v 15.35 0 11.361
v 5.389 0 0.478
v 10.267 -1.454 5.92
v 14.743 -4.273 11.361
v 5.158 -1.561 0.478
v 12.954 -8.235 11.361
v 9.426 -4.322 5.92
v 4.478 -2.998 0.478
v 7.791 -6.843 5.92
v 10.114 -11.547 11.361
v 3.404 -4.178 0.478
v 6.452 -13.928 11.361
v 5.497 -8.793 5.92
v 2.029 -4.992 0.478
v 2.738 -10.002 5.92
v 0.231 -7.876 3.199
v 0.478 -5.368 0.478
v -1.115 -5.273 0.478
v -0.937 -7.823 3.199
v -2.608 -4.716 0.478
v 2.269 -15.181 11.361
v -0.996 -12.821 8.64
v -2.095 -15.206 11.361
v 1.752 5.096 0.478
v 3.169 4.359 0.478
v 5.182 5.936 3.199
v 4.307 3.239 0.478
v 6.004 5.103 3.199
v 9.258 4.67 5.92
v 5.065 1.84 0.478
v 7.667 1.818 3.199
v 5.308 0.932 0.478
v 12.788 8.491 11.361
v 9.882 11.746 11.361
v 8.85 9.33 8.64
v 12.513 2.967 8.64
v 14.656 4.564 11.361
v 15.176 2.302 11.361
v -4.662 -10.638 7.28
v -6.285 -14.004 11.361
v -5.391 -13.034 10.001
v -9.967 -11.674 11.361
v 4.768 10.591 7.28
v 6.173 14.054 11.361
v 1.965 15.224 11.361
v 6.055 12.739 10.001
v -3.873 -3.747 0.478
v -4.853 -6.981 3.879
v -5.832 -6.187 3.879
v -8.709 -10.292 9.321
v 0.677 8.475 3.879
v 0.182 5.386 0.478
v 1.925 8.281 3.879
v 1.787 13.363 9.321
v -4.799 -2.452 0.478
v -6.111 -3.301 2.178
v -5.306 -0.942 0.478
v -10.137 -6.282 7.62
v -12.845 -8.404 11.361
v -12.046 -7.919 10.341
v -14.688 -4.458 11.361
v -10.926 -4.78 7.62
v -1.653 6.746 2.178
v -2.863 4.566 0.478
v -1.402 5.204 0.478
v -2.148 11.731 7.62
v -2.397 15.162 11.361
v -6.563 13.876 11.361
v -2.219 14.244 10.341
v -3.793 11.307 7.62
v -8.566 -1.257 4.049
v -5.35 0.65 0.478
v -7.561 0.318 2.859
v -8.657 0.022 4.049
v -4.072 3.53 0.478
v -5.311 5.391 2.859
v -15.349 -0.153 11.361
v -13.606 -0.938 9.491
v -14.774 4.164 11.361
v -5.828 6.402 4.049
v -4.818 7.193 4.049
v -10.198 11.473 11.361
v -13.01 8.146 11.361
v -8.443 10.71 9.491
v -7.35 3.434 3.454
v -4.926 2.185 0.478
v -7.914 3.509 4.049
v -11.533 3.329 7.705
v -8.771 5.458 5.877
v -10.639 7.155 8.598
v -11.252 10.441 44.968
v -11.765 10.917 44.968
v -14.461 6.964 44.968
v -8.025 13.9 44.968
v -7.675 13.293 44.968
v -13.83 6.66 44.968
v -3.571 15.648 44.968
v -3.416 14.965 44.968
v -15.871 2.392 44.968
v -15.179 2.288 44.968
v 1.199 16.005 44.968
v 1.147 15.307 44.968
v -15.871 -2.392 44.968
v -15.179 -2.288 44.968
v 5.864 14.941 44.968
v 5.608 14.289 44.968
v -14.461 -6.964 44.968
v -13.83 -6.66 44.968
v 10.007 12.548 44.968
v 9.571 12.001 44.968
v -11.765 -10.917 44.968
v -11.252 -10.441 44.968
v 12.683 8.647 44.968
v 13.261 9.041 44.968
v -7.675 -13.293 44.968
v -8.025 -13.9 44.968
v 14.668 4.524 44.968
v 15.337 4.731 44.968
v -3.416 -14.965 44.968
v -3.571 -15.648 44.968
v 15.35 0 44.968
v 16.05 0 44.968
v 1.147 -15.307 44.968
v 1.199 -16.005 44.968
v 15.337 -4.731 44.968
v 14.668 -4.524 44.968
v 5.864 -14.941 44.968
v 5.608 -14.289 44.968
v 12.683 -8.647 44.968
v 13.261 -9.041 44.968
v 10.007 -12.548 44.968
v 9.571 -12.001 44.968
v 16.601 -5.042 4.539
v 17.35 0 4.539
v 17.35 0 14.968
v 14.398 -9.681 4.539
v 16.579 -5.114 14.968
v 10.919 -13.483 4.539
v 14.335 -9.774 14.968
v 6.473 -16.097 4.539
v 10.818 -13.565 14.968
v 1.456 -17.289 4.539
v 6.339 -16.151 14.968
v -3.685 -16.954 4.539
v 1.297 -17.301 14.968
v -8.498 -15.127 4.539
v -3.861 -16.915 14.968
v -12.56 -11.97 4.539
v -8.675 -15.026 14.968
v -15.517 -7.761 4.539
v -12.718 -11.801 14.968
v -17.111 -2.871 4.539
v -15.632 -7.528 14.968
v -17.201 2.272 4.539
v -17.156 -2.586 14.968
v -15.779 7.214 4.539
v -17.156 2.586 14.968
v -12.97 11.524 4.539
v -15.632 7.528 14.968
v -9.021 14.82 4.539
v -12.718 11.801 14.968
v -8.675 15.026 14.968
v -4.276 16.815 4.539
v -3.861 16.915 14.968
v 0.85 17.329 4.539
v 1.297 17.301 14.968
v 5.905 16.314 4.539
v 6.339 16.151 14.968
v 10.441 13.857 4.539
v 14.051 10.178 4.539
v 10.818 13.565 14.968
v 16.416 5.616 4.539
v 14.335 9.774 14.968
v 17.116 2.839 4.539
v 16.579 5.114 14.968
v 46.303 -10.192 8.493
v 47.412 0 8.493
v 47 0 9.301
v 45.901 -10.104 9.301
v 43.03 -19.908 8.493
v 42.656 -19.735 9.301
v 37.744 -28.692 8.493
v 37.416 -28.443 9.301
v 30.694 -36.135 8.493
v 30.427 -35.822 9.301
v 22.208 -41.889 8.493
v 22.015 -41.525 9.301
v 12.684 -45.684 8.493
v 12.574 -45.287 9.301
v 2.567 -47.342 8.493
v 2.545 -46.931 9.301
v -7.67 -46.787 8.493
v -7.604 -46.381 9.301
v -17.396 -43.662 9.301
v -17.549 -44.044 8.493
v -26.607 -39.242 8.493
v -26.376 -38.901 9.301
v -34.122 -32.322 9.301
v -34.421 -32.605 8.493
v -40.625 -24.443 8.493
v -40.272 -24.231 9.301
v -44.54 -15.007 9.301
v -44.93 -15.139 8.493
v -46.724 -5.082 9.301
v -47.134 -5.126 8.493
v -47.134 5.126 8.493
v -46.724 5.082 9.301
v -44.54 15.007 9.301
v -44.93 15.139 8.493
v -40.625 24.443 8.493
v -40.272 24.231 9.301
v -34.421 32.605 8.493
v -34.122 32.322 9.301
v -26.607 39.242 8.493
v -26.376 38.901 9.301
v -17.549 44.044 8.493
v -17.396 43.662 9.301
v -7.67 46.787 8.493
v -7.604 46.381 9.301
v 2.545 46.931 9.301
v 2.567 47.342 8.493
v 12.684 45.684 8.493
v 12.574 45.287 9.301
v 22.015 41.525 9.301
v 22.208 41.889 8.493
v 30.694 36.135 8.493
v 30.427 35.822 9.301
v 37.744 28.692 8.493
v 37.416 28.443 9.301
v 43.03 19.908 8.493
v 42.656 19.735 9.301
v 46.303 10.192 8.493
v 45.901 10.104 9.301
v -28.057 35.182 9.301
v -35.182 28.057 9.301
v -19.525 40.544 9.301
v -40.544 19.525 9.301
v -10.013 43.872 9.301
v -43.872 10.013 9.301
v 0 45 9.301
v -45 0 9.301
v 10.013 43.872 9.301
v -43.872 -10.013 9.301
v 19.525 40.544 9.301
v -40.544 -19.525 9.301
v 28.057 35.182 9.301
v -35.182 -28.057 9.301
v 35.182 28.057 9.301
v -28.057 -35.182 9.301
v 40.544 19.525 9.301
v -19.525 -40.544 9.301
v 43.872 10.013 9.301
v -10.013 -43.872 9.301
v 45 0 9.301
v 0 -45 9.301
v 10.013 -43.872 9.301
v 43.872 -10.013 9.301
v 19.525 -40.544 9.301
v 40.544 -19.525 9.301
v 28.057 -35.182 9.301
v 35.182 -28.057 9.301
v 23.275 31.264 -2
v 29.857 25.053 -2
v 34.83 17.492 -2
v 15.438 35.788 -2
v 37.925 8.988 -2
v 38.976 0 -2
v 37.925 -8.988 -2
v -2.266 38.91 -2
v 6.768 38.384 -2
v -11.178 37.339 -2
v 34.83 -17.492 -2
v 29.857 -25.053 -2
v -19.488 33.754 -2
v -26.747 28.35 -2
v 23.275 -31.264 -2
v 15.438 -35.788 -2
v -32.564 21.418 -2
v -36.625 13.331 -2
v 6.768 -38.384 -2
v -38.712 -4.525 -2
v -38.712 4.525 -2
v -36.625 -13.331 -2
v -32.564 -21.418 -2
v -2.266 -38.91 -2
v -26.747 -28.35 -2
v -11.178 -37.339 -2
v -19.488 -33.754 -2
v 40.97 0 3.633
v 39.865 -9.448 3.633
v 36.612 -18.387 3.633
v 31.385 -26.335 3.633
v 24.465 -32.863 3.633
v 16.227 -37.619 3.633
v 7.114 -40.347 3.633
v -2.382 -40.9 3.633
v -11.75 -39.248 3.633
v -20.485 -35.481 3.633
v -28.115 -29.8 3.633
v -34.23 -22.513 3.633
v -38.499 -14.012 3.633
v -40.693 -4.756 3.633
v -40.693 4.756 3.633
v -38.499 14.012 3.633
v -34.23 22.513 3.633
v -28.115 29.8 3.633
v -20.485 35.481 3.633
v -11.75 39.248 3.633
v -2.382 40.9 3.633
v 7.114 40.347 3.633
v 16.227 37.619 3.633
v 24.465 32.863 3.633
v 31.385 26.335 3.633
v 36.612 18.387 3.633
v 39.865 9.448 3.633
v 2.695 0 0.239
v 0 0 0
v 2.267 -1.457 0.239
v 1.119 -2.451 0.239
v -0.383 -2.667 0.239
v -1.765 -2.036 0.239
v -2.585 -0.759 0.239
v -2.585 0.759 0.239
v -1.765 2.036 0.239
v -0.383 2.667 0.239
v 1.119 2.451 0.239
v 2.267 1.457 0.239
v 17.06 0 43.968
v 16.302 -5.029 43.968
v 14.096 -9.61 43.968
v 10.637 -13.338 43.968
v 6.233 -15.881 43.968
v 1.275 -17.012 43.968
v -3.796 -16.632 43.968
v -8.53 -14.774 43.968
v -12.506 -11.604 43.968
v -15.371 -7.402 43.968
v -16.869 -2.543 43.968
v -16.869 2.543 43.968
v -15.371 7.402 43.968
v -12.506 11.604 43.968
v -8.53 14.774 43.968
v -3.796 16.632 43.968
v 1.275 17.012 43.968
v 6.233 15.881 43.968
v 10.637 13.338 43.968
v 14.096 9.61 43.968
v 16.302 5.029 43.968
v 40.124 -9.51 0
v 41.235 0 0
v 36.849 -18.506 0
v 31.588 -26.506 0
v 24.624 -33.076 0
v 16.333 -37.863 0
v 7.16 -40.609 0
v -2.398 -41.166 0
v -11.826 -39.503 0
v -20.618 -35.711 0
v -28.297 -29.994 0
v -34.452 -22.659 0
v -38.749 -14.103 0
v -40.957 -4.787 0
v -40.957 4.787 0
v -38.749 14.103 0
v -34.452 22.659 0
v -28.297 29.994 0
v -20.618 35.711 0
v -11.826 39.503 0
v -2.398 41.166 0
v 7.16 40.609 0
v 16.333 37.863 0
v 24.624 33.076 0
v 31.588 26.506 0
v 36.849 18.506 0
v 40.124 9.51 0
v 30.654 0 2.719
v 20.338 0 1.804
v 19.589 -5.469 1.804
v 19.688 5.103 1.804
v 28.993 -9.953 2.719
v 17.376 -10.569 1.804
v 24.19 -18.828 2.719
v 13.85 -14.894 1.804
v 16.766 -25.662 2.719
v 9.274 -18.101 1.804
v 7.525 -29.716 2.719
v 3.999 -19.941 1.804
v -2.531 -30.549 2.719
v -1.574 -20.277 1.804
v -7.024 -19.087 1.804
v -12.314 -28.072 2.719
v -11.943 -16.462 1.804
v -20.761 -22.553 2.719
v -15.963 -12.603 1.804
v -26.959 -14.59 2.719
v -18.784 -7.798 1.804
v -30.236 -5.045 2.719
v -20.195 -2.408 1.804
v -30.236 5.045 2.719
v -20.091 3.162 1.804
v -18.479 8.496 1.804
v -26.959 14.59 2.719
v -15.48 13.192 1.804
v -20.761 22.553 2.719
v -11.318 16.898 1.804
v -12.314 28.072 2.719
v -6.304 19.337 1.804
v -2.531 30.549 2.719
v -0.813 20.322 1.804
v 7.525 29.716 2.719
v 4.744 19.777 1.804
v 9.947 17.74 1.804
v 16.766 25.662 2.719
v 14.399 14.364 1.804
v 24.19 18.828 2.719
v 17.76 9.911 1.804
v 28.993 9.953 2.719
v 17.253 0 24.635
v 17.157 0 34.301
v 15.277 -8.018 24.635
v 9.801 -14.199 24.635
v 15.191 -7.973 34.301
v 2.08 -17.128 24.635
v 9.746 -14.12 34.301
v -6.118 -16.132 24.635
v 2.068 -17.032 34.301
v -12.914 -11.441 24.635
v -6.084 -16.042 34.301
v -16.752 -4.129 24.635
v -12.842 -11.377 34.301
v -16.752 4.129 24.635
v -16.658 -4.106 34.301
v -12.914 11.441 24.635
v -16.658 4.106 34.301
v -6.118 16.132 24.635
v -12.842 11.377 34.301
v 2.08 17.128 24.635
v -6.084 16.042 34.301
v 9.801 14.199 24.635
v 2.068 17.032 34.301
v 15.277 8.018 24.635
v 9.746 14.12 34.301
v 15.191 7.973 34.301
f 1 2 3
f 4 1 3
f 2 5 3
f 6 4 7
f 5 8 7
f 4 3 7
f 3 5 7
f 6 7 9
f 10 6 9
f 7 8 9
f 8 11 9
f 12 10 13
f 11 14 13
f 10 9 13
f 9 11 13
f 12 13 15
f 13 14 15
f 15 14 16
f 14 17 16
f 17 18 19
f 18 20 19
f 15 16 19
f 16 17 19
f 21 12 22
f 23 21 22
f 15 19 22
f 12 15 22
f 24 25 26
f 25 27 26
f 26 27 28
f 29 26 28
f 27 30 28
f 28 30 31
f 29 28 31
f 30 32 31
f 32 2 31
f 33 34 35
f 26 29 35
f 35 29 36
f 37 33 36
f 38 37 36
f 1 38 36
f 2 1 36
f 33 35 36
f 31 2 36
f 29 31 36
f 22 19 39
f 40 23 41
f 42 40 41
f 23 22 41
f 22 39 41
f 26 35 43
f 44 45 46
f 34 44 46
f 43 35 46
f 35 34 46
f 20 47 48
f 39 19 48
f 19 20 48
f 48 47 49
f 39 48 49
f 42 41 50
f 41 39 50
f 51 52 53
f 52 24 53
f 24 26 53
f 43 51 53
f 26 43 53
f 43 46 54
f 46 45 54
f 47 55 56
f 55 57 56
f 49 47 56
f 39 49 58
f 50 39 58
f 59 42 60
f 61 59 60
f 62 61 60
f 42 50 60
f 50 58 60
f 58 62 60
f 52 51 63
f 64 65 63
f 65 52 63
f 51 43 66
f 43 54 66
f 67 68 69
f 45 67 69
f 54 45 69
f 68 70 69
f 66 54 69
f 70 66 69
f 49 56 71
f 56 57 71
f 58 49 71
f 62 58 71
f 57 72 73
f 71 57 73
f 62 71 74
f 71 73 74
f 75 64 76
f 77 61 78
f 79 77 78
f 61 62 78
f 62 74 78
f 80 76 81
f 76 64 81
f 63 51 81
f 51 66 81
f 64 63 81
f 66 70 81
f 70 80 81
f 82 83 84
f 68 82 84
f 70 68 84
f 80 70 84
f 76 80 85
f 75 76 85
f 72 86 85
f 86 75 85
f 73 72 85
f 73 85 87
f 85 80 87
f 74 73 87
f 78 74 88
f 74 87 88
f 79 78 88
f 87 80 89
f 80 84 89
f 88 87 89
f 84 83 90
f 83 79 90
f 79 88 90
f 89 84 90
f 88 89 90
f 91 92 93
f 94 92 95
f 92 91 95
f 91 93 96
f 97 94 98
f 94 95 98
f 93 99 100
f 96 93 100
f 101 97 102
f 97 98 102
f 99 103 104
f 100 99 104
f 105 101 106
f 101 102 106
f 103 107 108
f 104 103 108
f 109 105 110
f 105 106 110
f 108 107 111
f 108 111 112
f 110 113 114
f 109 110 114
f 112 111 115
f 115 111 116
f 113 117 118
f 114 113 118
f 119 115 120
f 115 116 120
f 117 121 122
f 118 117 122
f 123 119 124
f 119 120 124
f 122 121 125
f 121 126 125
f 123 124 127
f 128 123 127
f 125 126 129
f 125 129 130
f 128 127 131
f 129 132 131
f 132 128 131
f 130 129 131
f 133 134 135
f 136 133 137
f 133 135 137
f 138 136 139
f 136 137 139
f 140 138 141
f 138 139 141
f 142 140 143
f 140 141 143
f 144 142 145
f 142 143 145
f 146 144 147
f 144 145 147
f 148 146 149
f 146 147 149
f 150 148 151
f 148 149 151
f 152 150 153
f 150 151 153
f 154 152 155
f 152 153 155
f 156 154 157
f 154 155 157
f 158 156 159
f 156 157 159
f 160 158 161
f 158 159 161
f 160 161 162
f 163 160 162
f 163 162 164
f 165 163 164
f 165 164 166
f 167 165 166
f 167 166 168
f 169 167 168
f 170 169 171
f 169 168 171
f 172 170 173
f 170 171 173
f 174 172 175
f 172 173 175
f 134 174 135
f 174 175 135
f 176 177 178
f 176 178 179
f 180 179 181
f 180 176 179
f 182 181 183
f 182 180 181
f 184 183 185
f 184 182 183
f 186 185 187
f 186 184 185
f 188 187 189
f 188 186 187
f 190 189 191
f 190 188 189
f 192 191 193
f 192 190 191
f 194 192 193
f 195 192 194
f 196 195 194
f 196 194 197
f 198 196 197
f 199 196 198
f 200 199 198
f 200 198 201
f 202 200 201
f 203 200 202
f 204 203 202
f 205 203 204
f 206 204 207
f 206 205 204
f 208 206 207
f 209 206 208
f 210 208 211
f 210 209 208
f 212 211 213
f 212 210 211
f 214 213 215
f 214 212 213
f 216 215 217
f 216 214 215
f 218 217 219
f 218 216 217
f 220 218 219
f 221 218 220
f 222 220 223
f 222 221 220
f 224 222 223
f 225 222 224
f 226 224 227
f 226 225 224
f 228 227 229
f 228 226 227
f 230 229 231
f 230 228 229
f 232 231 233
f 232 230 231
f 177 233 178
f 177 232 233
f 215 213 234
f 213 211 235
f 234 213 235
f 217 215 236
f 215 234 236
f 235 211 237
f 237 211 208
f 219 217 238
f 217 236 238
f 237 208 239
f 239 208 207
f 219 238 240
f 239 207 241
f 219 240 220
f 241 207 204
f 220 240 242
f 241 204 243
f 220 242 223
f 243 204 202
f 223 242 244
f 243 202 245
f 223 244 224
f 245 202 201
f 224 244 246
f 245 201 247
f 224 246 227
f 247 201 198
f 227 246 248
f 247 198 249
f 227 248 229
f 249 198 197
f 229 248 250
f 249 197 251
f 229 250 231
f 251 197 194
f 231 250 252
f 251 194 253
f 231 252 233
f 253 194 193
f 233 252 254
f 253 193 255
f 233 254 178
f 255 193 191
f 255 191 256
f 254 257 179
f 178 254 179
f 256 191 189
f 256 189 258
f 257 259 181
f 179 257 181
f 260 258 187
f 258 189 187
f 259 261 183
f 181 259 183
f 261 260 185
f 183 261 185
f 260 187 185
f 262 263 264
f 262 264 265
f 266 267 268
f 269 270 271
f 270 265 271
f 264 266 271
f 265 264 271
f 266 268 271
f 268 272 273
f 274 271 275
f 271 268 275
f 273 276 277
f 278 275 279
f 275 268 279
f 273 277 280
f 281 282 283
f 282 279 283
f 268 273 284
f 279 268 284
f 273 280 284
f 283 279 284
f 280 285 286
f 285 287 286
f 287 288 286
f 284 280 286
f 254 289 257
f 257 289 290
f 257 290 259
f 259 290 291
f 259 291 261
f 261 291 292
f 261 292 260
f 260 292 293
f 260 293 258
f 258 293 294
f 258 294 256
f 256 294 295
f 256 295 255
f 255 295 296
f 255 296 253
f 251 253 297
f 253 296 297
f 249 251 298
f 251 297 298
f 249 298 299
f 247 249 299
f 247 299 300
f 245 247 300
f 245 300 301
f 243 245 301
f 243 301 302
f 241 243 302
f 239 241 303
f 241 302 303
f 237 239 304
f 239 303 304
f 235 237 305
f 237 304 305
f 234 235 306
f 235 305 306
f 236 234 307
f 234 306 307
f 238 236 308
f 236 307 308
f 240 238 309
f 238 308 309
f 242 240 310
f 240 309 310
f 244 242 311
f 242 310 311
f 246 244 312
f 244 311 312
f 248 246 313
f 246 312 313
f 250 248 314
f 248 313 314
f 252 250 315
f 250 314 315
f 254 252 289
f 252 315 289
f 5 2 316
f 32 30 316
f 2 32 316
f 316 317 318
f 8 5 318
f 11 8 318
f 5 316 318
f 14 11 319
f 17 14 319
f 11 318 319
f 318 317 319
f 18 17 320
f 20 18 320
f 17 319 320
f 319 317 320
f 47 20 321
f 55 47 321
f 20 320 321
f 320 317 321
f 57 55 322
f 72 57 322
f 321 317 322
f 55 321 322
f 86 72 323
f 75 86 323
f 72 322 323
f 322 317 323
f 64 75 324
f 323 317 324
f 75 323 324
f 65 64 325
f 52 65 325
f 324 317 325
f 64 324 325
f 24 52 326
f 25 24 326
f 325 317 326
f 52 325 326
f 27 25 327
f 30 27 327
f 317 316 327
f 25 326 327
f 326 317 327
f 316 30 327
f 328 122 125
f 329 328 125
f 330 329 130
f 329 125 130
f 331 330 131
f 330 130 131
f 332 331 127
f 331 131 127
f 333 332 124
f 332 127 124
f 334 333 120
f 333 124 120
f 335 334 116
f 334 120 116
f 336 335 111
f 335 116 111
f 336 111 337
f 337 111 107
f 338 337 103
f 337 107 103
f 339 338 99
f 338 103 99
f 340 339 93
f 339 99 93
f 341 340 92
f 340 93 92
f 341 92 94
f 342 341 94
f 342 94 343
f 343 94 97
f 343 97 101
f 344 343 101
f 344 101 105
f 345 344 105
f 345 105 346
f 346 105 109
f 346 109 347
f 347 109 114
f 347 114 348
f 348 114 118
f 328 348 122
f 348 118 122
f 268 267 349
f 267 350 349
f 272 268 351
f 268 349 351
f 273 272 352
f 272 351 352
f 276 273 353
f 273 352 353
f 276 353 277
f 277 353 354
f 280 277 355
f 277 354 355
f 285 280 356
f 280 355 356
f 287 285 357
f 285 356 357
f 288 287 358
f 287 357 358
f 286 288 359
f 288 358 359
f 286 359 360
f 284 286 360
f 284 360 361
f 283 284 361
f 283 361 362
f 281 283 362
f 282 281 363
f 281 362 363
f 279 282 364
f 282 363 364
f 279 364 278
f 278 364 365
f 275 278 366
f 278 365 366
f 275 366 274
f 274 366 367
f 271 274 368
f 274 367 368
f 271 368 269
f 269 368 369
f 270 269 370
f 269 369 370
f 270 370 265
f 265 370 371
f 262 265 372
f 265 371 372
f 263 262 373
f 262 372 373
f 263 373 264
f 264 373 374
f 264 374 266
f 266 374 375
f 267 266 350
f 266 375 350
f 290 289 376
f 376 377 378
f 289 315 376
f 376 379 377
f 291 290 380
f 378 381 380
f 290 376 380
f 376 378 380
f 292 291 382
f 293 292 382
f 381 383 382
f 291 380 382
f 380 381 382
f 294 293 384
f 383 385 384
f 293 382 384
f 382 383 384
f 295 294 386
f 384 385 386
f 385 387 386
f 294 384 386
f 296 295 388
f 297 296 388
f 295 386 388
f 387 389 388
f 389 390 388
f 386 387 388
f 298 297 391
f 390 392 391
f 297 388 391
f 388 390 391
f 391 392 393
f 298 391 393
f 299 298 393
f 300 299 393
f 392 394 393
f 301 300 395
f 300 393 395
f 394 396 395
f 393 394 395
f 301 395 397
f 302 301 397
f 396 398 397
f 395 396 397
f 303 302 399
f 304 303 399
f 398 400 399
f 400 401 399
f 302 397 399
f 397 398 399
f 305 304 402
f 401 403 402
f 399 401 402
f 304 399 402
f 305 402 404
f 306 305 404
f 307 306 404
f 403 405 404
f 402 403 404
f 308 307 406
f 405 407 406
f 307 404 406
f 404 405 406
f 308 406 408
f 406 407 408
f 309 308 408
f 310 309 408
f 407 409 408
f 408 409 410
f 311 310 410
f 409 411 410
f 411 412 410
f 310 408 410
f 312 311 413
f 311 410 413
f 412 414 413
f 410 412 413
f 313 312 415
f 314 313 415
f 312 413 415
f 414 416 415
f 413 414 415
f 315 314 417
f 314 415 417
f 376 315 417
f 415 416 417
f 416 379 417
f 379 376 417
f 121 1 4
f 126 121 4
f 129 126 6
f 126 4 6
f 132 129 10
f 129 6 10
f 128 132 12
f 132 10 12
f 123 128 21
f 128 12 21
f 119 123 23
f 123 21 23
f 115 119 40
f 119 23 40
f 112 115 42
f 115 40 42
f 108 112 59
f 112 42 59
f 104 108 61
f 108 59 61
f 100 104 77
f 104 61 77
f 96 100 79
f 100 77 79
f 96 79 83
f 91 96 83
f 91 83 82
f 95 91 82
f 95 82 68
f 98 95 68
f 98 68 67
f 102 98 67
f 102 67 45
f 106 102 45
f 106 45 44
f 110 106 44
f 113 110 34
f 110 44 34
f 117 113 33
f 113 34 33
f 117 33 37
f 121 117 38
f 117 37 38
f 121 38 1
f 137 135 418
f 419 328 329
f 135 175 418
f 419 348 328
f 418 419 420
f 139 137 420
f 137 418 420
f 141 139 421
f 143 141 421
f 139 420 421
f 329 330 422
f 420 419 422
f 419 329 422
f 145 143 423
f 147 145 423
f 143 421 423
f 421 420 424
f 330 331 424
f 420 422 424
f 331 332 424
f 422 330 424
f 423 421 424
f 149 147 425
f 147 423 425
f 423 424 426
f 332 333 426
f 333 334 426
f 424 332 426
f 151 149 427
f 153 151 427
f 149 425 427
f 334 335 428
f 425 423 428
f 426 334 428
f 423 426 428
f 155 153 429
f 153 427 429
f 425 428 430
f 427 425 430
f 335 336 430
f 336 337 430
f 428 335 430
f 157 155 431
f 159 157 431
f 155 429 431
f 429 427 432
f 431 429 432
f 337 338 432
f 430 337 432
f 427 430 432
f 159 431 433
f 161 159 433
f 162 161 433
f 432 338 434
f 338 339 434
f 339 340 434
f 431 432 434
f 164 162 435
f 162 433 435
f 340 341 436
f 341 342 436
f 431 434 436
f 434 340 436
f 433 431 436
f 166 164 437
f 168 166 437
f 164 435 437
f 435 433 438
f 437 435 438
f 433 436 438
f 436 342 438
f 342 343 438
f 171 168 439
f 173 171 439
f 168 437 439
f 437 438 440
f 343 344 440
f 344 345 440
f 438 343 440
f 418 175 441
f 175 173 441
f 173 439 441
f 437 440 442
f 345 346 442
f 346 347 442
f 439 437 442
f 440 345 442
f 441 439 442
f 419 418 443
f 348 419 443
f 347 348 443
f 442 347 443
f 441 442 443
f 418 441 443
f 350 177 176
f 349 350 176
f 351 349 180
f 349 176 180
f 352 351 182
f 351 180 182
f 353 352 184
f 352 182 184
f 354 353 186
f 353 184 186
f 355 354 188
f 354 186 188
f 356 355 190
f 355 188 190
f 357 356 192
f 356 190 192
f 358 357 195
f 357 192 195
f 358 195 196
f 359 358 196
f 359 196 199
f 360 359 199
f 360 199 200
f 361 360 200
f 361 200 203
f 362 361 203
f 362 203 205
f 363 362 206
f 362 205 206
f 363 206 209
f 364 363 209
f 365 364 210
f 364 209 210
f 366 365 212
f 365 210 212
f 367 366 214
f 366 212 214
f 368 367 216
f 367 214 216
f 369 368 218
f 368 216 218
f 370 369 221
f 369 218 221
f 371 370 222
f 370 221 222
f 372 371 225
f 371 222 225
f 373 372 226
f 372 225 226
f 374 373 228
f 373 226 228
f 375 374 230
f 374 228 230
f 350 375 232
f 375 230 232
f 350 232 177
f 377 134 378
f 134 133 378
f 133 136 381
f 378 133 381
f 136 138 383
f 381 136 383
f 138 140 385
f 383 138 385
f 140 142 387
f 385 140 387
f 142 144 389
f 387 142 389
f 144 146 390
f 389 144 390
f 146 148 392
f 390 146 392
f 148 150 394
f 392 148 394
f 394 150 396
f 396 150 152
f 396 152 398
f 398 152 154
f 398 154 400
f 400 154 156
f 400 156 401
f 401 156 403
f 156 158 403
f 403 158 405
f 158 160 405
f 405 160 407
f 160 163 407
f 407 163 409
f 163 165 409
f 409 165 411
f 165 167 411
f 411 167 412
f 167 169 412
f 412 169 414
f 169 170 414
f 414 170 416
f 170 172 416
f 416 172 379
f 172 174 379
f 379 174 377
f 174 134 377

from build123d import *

# Parameters (mm, degrees)
F2_SIZE  = 10
F3_SIZE  = 3
F4_SIZE2 = 0.3
F4_SIZE  = 30
F5_SIZE  = 1
F6_SIZE  = 1


with BuildPart() as f1:
    # F0 (on Front) → F1 (revolve)
    with BuildSketch(Plane.XZ):
        Polygon((15.35, 1.3613448423), (0, 0), (15.35, 0), align=None)
        Polygon((15.35, 0), (0, 0), (0, -2), (38.9759652317, -2), (41.235409677, 0), (35, 0), (17.35, 0), align=None)
        Polygon((15.35, 1.3613448423), (15.35, 0), (17.35, 0), (17.35, 1.5387187631), align=None)
        Polygon((15.35, 44.9680350721), (15.35, 1.3613448423), (17.35, 1.5387187631), (17.35, 44.9680350721), align=None)
        Polygon((17.35, 1.5387187631), (17.35, 0), (35, 0), (41.235409677, 0), (48, 9.3012940374), (45, 9.3012940374), (40.9695953131, 3.6334688775), align=None)
    revolve(axis=Axis((0, 0, 15.92751313), (0, 0, -1)))

    # F2
    f2_edges = [f1.edges().sort_by_distance(p)[0] for p in [
        (-15.35, 0, 1.361345),
    ]]
    chamfer(f2_edges, length=F2_SIZE)

    # F3
    f3_edges = [f1.edges().sort_by_distance(p)[0] for p in [
        (-17.35, 0, 1.538719),
    ]]
    chamfer(f3_edges, length=F3_SIZE)

    # F4
    f4_edges = [f1.edges().sort_by_distance(p)[0] for p in [
        (-17.35, 0, 44.968035),
    ]]
    f4_side = f1.faces().sort_by_distance((-17.35, 0, 24.753377))[0]
    chamfer(f4_edges, length=F4_SIZE, length2=F4_SIZE2, reference=f4_side)

    # F5
    f5_edges = [f1.edges().sort_by_distance(p)[0] for p in [
        (-48, 0, 9.301294),
    ]]
    chamfer(f5_edges, length=F5_SIZE)

    # F6
    f6_edges = [f1.edges().sort_by_distance(p)[0] for p in [
        (-17.05, 0, 44.968035),
    ]]
    chamfer(f6_edges, length=F6_SIZE)


solid = f1.part
